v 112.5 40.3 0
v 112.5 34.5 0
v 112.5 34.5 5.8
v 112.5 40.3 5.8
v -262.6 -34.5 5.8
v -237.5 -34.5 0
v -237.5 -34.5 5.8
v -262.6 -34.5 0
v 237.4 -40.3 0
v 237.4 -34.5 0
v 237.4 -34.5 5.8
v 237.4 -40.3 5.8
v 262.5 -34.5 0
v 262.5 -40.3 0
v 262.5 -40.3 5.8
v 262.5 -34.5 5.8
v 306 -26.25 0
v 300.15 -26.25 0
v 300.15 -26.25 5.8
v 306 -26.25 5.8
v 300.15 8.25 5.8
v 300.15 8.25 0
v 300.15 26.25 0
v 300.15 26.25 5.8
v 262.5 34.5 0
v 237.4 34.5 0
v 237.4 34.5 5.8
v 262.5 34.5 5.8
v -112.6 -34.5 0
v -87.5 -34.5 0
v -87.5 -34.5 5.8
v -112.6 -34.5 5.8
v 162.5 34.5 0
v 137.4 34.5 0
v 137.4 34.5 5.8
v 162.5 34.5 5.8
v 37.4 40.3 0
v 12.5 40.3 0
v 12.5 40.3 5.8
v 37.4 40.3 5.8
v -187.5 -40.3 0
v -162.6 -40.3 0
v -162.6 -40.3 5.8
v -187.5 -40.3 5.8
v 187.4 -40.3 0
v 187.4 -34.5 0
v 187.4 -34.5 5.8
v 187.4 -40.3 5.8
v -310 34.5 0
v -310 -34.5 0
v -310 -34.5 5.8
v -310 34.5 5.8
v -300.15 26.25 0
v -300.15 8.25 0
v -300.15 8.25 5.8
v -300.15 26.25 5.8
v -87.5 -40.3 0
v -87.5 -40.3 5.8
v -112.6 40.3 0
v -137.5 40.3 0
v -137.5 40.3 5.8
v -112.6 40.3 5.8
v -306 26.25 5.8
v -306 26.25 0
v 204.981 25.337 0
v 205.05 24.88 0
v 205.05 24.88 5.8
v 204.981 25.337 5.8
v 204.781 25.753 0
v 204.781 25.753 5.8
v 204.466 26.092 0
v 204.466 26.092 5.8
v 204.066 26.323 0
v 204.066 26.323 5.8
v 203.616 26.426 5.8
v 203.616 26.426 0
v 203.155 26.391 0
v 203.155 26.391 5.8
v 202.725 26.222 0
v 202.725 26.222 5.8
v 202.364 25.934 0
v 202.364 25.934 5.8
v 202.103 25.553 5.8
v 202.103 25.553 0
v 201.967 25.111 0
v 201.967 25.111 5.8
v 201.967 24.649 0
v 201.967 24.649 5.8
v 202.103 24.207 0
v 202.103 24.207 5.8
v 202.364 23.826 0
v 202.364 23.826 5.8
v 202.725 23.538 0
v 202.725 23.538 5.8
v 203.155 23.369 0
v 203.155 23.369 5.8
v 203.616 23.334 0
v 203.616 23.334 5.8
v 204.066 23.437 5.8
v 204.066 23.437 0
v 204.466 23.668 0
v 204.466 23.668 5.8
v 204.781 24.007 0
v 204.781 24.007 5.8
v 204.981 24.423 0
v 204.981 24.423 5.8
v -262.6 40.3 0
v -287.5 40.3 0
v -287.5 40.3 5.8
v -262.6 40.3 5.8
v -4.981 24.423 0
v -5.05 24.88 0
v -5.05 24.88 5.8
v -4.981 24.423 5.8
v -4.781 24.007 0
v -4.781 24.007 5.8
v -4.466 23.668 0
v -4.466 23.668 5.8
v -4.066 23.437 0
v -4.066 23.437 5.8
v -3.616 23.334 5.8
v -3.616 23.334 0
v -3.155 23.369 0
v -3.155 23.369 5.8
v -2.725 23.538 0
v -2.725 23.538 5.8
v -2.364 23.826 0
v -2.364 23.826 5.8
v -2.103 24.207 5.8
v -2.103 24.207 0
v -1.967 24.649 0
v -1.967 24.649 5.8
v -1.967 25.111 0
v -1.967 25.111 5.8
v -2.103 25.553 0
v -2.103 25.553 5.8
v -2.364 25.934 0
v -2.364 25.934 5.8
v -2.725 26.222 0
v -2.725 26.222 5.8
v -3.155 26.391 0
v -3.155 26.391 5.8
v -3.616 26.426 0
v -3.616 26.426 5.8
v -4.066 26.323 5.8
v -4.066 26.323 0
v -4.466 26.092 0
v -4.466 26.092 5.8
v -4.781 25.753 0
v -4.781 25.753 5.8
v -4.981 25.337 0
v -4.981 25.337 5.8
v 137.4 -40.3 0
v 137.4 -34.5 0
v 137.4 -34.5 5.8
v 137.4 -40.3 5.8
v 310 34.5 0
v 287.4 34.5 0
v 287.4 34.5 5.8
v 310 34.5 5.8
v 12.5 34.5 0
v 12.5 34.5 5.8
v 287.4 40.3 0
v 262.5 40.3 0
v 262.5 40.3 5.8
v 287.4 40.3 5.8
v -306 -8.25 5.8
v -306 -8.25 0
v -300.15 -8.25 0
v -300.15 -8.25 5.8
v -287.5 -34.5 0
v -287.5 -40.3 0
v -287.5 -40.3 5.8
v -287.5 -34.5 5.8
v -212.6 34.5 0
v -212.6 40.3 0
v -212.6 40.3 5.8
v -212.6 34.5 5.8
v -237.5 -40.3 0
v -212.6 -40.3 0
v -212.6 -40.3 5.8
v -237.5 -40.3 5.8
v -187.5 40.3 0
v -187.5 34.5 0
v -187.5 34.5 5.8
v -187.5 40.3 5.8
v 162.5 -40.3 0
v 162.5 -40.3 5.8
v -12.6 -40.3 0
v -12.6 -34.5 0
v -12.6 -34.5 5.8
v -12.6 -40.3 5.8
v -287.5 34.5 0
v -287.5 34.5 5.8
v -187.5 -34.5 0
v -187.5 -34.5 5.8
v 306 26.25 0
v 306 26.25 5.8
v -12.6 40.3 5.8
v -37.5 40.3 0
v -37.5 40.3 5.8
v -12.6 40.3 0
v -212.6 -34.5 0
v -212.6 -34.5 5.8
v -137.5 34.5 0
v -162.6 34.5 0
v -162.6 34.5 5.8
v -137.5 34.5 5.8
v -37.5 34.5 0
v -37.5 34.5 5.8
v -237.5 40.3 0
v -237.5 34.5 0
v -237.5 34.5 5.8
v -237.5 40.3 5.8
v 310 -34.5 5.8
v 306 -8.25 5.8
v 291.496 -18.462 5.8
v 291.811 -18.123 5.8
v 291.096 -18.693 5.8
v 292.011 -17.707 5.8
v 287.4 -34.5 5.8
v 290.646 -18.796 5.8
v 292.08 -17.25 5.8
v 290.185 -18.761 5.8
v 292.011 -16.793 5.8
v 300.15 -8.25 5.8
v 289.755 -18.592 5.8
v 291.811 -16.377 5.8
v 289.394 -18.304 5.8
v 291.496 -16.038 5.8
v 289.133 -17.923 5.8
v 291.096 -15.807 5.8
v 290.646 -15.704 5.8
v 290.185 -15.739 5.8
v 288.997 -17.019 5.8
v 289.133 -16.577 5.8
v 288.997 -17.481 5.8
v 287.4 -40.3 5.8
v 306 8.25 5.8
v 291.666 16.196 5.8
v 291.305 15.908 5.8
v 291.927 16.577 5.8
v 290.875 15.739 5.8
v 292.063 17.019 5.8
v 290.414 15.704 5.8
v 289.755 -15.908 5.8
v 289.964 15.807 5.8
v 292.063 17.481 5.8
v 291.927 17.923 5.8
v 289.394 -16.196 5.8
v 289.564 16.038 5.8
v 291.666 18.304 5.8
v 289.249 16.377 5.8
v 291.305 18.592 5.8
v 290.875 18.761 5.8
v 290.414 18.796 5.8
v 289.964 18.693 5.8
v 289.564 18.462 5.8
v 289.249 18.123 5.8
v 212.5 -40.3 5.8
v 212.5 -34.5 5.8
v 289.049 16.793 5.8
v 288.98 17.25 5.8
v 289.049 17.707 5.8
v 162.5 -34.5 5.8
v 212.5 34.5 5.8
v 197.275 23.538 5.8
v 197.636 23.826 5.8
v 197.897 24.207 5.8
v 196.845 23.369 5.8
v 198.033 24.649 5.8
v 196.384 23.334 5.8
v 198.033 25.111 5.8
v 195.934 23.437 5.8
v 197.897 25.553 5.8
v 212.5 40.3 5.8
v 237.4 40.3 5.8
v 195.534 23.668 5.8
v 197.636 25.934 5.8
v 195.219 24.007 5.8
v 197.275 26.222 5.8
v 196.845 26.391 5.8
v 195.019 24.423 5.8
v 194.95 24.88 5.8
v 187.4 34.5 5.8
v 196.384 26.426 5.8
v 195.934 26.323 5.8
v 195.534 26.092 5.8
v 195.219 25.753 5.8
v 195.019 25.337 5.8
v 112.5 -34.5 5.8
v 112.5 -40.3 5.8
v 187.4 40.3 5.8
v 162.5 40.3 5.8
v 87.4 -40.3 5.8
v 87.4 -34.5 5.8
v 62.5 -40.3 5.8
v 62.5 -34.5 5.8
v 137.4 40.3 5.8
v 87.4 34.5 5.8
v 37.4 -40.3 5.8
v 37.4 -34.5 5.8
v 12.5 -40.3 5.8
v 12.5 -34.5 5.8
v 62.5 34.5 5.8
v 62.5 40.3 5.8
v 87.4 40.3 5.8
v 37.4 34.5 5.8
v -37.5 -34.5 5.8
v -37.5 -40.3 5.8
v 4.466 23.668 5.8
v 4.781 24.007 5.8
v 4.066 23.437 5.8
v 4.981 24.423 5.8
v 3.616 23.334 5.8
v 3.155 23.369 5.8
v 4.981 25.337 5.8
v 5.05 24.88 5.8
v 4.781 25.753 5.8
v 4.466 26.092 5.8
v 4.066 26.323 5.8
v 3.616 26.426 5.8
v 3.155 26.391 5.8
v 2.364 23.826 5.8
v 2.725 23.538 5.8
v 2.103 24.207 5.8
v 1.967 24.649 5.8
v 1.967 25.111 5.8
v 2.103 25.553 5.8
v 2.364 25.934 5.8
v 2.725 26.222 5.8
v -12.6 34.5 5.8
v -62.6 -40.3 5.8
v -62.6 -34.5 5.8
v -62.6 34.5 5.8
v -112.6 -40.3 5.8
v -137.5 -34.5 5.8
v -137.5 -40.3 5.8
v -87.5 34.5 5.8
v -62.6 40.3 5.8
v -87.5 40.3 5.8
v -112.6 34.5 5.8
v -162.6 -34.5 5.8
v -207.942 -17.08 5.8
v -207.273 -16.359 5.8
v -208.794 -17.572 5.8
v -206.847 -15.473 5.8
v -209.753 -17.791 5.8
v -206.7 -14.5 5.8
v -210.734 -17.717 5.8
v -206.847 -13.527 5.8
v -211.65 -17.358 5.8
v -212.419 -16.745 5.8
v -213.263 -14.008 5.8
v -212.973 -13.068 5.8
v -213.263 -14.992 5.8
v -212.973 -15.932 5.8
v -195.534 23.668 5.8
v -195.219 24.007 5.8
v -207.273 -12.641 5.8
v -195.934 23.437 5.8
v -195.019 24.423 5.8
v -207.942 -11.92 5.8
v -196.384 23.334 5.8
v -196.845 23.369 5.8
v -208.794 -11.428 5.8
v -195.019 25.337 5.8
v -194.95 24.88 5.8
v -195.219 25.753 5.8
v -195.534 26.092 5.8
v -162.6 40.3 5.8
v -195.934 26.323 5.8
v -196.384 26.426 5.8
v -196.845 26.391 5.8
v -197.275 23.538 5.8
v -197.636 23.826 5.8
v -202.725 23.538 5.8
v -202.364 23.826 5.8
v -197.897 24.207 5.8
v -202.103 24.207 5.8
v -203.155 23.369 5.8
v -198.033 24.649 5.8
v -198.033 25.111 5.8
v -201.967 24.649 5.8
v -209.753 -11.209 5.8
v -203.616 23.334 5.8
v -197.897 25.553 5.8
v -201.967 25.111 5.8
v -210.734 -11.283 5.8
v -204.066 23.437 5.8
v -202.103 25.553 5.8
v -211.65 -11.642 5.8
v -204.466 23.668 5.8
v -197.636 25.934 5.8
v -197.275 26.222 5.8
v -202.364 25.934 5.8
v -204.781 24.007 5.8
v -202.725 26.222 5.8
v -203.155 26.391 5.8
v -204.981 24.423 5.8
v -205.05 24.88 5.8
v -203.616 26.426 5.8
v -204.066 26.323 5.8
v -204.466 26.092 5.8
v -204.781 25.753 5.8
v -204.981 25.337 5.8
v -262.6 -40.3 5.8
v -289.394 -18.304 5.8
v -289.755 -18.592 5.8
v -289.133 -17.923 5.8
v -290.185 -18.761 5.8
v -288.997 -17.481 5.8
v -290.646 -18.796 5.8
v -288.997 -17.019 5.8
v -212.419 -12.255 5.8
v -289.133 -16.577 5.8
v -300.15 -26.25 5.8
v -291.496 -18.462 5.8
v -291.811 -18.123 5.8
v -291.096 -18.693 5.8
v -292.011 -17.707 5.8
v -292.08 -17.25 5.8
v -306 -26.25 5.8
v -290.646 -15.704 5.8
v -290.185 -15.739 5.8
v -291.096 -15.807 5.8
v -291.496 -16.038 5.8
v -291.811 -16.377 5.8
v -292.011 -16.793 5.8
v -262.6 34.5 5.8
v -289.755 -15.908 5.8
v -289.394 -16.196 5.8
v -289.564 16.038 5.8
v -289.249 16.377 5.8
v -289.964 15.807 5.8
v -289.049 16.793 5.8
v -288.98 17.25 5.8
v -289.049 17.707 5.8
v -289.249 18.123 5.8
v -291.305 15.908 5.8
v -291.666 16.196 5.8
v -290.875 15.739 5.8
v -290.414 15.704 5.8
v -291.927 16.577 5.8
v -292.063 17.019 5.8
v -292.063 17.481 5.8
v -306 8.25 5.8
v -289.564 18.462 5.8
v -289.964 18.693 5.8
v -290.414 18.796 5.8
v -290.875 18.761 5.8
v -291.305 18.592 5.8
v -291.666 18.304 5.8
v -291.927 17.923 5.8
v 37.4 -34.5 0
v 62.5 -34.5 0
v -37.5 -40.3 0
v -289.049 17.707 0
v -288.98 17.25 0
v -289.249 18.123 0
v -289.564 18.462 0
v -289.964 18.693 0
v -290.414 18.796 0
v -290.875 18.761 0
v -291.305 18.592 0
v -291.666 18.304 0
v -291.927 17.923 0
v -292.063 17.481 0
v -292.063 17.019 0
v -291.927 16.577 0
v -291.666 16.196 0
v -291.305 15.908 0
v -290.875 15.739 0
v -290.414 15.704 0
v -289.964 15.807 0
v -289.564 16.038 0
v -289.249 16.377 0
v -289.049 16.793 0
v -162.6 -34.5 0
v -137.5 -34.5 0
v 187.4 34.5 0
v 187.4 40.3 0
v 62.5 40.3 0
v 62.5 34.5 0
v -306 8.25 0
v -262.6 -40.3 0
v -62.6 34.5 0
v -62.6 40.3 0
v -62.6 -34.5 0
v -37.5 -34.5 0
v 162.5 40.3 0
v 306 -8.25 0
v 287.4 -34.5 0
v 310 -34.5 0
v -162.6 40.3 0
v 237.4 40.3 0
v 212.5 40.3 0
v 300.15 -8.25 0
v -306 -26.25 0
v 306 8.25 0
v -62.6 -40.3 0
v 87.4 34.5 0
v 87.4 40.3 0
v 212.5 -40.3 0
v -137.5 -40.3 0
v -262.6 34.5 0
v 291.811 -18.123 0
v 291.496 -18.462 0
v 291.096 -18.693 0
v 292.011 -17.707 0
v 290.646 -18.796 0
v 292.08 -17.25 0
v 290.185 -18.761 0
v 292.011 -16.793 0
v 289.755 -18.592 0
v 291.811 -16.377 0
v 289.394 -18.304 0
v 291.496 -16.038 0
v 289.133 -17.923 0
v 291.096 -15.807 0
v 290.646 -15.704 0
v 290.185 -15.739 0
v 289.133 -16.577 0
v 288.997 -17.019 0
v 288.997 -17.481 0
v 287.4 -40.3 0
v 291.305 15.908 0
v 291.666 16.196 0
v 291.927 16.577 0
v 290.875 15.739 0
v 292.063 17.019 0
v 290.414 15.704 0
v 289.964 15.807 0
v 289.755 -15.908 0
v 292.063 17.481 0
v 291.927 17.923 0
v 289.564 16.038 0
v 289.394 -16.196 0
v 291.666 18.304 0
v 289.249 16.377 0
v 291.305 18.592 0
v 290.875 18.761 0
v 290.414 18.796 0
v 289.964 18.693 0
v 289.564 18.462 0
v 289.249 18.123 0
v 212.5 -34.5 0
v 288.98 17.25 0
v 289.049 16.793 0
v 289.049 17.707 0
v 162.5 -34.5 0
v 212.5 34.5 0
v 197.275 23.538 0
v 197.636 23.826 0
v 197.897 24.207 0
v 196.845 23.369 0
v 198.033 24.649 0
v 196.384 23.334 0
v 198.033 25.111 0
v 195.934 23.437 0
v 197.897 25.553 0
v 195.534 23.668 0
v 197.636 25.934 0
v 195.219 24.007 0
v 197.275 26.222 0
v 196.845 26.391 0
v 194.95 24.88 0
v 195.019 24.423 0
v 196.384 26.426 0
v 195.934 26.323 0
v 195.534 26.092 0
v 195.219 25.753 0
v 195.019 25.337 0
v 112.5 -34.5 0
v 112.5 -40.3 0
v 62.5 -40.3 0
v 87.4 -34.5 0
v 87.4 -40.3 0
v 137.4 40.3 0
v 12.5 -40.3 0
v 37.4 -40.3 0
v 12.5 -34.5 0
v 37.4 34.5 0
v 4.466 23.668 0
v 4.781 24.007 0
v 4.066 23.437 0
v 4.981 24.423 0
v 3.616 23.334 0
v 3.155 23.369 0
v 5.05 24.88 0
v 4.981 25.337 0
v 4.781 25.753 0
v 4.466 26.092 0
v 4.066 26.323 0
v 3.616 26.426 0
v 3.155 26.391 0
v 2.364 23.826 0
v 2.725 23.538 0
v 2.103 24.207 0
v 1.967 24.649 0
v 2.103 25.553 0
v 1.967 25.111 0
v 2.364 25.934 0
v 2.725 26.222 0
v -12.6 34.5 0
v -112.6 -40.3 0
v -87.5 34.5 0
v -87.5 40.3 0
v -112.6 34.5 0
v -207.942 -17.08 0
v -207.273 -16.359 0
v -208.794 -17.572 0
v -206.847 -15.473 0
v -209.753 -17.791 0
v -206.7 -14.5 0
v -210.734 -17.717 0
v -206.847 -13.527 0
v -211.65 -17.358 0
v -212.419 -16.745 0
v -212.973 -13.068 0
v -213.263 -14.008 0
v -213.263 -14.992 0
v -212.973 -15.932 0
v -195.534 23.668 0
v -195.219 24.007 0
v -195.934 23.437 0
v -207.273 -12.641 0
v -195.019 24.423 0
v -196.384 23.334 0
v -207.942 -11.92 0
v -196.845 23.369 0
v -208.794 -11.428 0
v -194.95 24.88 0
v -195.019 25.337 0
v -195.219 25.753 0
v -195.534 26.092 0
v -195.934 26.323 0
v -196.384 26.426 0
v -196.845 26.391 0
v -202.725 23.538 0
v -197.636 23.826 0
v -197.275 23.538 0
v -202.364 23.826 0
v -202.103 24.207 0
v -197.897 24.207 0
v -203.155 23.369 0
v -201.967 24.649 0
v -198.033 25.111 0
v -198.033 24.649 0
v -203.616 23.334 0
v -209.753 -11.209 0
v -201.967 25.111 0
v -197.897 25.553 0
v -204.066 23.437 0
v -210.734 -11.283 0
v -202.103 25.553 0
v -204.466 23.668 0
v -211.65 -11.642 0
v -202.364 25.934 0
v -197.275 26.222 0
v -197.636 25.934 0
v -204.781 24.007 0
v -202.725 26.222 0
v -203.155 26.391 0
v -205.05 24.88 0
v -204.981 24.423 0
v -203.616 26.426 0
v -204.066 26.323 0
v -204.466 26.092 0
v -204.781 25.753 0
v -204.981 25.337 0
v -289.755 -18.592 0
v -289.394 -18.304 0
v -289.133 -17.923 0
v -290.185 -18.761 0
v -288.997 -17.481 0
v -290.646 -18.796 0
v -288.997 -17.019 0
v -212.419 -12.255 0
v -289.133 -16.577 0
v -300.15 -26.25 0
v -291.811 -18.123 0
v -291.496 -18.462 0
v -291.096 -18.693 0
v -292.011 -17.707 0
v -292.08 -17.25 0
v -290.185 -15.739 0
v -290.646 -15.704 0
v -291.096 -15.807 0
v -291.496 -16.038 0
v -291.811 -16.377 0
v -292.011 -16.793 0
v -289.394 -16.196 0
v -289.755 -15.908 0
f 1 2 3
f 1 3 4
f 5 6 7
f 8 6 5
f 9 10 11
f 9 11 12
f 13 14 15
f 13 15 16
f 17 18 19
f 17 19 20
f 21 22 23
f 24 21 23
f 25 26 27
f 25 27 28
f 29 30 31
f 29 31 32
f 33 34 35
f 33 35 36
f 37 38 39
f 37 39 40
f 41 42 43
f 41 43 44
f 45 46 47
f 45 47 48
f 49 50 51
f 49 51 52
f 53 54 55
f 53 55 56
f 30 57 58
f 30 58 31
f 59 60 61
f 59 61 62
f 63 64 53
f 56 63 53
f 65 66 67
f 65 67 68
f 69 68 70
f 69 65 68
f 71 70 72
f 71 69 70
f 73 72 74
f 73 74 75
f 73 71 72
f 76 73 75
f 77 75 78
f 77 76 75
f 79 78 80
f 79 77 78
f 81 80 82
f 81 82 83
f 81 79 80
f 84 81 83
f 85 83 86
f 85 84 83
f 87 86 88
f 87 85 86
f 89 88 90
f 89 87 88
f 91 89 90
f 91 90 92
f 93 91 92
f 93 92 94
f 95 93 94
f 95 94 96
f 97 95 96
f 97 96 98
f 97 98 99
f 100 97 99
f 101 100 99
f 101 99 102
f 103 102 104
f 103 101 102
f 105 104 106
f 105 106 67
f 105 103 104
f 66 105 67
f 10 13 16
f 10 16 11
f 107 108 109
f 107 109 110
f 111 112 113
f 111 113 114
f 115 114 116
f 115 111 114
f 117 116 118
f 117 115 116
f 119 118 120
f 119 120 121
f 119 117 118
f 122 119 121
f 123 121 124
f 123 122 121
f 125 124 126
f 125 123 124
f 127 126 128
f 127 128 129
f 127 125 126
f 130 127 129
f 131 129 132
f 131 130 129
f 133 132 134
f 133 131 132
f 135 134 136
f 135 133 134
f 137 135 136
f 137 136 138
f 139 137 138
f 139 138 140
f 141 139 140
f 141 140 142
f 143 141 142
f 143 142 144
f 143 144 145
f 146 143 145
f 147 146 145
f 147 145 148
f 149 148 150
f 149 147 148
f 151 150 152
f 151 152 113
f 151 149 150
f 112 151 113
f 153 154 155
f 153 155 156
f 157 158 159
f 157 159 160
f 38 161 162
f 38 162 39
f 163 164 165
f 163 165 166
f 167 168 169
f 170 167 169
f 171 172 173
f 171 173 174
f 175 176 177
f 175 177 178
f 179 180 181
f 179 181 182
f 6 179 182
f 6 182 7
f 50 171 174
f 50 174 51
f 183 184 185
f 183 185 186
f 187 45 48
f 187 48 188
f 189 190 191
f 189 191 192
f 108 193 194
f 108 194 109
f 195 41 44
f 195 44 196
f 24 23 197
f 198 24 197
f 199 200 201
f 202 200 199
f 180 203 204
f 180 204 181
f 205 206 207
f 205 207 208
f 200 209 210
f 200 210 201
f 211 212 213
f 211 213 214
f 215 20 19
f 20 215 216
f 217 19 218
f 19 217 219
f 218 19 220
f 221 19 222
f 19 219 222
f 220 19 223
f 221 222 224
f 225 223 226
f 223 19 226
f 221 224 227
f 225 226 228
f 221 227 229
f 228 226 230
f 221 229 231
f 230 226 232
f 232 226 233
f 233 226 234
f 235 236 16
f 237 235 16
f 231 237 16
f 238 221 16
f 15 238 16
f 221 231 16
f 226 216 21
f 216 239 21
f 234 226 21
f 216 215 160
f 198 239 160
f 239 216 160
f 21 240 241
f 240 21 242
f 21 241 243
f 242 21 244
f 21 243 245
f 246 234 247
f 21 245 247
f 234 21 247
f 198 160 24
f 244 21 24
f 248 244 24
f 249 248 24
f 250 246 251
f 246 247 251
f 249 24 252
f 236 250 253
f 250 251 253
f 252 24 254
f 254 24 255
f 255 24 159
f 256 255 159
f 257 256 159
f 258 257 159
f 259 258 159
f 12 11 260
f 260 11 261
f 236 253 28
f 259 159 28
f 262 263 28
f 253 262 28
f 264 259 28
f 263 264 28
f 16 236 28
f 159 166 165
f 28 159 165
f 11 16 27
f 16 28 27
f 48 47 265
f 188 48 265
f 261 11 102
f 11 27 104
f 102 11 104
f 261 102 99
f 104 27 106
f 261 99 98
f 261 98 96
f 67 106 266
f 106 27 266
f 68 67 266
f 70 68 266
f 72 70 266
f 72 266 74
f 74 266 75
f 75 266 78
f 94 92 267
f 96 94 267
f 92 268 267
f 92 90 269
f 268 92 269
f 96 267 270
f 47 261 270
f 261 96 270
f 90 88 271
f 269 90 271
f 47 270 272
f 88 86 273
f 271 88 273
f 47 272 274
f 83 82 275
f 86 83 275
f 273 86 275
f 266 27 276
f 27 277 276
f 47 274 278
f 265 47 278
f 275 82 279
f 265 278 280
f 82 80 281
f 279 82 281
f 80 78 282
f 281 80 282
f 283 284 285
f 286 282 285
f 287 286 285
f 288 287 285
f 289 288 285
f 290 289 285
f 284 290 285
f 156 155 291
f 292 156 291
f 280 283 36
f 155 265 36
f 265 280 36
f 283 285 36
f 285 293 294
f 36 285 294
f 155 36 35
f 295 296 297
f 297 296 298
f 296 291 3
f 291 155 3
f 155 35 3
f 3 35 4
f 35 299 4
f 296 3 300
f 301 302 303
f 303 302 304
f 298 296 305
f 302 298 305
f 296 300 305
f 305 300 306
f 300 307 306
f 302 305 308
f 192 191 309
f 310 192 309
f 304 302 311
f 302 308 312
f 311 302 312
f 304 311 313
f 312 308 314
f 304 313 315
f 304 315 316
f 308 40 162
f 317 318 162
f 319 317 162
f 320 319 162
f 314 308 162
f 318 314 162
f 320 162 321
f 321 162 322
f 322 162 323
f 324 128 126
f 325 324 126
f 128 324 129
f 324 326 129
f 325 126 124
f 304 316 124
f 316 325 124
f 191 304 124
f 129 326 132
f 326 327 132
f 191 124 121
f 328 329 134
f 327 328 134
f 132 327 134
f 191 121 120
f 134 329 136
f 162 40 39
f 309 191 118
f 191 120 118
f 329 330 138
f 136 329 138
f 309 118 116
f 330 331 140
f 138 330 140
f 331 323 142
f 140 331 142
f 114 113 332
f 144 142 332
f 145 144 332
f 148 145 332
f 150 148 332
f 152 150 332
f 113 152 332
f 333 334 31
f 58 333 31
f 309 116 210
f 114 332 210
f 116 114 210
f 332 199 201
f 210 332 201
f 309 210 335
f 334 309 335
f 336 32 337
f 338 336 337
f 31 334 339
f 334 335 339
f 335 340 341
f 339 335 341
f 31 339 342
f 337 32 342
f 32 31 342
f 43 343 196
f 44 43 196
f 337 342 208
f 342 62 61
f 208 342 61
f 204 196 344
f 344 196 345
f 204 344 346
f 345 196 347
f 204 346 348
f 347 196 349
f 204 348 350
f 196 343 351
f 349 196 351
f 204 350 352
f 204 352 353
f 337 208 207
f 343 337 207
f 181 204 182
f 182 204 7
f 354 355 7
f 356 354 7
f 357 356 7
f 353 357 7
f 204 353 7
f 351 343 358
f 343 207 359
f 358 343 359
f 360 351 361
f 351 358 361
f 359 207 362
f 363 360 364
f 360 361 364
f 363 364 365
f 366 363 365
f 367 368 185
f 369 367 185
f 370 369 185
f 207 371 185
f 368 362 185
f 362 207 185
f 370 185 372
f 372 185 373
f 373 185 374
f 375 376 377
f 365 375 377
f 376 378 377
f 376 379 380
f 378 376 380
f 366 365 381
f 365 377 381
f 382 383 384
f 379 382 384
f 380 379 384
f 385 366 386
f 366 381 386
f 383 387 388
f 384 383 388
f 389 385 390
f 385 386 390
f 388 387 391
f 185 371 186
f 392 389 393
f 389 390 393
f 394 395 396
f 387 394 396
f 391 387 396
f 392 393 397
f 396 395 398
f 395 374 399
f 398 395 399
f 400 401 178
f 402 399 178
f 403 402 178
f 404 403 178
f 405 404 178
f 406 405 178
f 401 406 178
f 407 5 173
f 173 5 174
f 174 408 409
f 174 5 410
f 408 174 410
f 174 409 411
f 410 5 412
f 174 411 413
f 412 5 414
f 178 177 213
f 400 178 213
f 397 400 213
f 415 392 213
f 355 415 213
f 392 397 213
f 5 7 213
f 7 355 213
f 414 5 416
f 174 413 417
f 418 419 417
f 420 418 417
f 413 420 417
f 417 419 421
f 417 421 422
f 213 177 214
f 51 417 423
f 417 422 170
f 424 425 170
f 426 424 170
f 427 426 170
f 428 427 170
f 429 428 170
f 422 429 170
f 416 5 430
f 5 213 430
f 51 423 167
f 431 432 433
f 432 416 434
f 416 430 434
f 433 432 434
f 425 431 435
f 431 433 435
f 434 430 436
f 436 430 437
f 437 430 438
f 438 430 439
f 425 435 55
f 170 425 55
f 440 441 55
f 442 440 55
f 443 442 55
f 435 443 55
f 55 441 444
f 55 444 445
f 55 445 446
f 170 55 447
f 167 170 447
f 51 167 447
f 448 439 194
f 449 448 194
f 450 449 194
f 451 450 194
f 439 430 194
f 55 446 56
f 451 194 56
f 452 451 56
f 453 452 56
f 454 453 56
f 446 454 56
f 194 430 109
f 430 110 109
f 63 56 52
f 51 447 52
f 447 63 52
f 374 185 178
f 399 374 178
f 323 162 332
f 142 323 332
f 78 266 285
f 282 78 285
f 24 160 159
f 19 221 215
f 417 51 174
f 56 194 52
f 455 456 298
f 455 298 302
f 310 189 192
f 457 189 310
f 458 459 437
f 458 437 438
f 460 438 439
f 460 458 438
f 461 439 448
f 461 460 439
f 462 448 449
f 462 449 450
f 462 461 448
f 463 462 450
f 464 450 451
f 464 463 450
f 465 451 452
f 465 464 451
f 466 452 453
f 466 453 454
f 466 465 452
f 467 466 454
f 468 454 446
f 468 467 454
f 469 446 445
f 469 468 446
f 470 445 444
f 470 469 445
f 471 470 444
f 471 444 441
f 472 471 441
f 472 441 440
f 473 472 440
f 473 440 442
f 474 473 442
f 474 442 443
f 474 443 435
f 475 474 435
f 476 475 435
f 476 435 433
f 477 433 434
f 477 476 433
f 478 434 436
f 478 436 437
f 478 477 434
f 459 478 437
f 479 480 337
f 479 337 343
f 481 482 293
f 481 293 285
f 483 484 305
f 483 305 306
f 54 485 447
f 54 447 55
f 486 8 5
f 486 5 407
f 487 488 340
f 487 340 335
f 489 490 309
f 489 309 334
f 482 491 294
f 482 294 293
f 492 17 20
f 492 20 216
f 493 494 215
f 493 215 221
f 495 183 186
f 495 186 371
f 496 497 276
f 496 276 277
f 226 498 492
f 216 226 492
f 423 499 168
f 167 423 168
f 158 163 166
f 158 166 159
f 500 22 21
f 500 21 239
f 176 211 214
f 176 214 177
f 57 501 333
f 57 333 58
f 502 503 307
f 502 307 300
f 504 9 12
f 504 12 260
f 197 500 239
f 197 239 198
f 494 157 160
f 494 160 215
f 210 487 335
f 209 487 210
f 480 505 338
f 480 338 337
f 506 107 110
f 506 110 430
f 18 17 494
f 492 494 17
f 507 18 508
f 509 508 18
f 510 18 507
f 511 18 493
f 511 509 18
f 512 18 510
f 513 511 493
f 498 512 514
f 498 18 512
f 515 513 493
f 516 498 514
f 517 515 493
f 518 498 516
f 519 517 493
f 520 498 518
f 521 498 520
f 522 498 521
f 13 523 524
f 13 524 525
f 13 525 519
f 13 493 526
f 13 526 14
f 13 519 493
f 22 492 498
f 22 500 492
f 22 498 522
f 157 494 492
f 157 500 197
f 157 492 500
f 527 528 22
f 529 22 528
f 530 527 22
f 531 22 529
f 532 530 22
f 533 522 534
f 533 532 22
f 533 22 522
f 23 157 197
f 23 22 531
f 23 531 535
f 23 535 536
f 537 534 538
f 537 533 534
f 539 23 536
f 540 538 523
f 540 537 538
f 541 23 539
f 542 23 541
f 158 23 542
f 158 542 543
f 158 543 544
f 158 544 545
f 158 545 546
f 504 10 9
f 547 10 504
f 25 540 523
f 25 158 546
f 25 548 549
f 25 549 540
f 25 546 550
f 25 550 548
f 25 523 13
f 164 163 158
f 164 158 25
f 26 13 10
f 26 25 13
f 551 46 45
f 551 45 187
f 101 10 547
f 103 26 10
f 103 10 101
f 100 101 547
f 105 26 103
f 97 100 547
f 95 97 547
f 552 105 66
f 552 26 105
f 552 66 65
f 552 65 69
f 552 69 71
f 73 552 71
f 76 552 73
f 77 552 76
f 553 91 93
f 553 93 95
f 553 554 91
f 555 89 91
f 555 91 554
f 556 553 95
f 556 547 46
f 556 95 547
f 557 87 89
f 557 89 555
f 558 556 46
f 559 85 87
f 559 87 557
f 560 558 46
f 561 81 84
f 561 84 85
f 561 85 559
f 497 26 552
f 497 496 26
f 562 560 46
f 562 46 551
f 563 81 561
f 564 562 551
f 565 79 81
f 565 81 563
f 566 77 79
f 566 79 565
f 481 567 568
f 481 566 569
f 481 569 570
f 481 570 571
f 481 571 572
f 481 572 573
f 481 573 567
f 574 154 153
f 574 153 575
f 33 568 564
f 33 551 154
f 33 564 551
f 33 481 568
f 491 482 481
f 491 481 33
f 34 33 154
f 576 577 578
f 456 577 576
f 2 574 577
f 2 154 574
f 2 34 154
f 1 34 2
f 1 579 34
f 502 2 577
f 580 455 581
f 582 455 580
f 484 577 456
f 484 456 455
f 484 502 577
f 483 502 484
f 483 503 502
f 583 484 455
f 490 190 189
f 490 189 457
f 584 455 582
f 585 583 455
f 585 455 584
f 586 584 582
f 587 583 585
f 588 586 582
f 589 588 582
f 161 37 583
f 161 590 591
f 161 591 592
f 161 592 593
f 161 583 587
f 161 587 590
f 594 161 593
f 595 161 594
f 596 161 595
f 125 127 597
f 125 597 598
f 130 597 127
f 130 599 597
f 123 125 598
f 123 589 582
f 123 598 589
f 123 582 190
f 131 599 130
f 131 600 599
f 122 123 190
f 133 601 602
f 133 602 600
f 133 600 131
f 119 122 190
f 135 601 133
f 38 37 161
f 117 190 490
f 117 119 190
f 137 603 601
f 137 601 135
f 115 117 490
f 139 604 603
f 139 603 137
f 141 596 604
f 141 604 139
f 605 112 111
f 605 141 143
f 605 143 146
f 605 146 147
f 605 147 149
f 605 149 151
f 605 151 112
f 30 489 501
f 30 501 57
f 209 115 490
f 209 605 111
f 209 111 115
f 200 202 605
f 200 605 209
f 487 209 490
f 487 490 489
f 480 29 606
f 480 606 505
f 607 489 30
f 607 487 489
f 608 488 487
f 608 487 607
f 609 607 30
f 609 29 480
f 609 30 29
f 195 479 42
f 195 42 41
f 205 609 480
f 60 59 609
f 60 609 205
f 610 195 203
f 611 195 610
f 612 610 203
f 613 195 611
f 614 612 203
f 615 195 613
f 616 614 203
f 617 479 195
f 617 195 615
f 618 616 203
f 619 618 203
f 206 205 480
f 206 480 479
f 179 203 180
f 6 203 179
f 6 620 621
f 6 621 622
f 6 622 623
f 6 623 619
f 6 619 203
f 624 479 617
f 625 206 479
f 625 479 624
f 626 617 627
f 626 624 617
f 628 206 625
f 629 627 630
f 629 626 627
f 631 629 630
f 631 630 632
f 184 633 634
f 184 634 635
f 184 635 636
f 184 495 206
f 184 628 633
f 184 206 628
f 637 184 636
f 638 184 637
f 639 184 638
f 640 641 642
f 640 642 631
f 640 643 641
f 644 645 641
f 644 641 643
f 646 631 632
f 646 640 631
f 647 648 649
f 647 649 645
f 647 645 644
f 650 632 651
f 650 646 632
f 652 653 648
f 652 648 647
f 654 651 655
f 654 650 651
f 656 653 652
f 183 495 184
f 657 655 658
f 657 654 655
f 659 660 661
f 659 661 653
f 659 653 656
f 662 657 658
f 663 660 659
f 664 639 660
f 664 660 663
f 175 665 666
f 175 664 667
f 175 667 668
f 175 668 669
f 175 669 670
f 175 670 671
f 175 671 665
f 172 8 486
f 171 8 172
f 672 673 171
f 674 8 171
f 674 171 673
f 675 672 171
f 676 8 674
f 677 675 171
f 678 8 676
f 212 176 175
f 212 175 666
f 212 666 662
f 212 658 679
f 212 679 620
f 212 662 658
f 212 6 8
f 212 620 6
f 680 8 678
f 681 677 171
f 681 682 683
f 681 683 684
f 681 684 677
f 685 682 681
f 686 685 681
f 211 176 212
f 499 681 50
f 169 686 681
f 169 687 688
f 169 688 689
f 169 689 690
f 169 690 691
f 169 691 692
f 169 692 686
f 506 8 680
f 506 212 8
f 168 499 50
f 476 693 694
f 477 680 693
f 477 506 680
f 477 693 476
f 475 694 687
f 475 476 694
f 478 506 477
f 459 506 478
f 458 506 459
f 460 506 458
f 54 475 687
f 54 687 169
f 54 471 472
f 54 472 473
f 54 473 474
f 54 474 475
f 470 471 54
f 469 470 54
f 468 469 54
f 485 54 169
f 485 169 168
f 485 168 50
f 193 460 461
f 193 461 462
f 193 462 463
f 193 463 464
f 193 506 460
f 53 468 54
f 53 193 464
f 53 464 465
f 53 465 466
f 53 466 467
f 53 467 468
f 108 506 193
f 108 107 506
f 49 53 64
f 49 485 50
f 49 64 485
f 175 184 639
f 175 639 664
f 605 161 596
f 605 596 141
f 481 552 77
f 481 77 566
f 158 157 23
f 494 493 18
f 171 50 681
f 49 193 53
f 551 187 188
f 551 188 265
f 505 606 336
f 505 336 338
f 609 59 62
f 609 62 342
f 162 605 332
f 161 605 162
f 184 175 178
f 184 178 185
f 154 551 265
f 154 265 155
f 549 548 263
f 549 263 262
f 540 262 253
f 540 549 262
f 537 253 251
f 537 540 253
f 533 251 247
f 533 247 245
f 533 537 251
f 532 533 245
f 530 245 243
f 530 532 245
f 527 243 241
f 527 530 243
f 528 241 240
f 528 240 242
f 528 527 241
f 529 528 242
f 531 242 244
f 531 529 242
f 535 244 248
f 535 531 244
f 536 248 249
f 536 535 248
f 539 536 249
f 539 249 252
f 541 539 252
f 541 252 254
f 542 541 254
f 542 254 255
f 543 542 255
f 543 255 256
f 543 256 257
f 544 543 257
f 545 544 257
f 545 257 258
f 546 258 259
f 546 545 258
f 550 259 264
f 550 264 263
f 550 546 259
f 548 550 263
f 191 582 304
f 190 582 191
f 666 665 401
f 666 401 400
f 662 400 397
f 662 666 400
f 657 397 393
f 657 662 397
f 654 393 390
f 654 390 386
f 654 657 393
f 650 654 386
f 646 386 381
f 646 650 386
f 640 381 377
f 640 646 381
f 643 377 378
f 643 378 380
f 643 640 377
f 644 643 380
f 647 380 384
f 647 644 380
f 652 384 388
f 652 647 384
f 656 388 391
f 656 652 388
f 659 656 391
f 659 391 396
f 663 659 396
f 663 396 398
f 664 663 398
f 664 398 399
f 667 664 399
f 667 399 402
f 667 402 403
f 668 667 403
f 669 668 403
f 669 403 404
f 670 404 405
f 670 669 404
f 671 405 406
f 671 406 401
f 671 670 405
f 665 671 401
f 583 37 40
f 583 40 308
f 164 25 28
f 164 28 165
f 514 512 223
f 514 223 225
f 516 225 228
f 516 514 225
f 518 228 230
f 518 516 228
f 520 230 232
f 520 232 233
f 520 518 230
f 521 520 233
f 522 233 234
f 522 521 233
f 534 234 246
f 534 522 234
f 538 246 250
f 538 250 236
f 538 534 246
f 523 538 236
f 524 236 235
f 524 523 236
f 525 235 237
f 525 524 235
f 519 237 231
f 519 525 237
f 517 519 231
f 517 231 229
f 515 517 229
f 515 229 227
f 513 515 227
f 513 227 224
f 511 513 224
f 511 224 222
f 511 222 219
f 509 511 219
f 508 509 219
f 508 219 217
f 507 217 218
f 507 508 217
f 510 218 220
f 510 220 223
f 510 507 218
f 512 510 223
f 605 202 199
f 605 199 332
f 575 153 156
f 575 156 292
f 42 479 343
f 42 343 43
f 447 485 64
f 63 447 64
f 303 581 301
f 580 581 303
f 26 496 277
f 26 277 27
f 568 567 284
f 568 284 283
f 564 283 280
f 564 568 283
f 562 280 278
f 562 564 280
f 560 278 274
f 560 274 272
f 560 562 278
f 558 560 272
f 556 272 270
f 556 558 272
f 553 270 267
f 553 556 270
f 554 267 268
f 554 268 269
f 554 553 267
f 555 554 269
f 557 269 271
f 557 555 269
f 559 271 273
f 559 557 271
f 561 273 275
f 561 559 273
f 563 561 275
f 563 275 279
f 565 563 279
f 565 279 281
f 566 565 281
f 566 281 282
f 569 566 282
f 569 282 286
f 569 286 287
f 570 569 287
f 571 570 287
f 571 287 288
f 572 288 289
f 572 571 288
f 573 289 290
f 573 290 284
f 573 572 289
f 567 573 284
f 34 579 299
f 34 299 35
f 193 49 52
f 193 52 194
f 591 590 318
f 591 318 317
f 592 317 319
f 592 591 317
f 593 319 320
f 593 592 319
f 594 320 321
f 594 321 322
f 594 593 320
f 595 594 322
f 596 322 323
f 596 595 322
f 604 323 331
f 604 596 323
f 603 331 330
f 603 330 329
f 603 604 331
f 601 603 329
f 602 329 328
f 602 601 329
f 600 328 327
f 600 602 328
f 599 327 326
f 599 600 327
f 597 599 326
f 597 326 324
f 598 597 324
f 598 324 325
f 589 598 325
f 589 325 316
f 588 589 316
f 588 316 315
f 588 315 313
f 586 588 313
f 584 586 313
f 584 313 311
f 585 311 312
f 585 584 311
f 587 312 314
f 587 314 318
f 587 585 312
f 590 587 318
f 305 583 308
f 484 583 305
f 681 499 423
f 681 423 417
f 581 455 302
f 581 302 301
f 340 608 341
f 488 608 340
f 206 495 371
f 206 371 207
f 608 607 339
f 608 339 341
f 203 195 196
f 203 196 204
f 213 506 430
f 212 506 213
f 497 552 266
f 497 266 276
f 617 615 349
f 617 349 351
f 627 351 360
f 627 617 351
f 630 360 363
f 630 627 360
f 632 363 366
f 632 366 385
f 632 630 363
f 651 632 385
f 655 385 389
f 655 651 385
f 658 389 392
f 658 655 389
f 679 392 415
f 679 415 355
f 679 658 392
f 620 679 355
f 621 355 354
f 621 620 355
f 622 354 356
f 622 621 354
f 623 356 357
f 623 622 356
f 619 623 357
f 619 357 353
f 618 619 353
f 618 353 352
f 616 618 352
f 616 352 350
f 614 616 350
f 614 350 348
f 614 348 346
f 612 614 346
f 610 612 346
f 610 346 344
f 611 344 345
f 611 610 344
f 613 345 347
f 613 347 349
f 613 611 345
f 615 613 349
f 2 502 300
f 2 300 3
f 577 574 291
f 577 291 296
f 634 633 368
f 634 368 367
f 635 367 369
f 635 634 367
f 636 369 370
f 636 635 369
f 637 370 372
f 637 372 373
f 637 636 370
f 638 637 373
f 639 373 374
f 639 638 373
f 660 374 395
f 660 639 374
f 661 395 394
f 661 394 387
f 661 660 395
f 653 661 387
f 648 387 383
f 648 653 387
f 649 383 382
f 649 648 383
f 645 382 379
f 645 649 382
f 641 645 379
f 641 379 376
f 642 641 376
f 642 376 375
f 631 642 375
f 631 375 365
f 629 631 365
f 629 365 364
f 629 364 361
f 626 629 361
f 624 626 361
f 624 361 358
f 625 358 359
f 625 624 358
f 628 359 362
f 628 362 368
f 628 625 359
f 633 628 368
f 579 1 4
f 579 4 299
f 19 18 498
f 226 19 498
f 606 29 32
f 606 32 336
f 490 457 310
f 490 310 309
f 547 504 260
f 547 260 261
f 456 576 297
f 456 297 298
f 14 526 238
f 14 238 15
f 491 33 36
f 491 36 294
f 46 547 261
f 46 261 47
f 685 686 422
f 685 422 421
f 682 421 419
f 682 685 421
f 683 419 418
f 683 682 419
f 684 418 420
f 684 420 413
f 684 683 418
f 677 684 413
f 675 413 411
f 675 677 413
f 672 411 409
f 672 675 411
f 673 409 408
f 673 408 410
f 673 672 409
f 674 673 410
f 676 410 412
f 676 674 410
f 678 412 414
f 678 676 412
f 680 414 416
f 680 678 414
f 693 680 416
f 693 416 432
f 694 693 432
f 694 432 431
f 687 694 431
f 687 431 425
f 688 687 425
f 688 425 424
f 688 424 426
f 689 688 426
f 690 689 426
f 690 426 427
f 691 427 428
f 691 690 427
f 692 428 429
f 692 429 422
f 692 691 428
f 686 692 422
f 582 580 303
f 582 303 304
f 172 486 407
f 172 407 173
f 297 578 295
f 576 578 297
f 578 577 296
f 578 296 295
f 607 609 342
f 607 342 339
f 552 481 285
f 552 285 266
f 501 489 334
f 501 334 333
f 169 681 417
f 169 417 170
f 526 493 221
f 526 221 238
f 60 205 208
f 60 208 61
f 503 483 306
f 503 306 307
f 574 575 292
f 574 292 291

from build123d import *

# Parameters (mm, degrees)
SKETCH1_R           = 3.3
SKETCH1_R_2         = 1.55
SKETCH1_W           = 5.85
SKETCH1_H           = 18
BOSS_EXTRUDE1_DEPTH = 5.8


with BuildPart() as part:
    # Sketch1 → Boss-Extrude1 (new body)
    with BuildSketch(Plane.XY):
        Polygon((-237.5, 34.5), (-237.5, 40.3), (-212.6, 40.3), (-212.6, 34.5), (-187.5, 34.5), (-187.5, 40.3), (-162.6, 40.3), (-162.6, 34.5), (-137.5, 34.5), (-137.5, 40.3), (-112.6, 40.3), (-112.6, 34.5), (-87.5, 34.5), (-87.5, 40.3), (-62.6, 40.3), (-62.6, 34.5), (-37.5, 34.5), (-37.5, 40.3), (-12.6, 40.3), (-12.6, 34.5), (12.5, 34.5), (12.5, 40.3), (37.4, 40.3), (37.4, 34.5), (62.5, 34.5), (62.5, 40.3), (87.4, 40.3), (87.4, 34.5), (112.5, 34.5), (112.5, 40.3), (137.4, 40.3), (137.4, 34.5), (162.5, 34.5), (162.5, 40.3), (187.4, 40.3), (187.4, 34.5), (212.5, 34.5), (212.5, 40.3), (237.4, 40.3), (237.4, 34.5), (262.5, 34.5), (262.5, 40.3), (287.4, 40.3), (287.4, 34.5), (310, 34.5), (310, -34.5), (287.4, -34.5), (287.4, -40.3), (262.5, -40.3), (262.5, -34.5), (237.4, -34.5), (237.4, -40.3), (212.5, -40.3), (212.5, -34.5), (187.4, -34.5), (187.4, -40.3), (162.5, -40.3), (162.5, -34.5), (137.4, -34.5), (137.4, -40.3), (112.5, -40.3), (112.5, -34.5), (87.4, -34.5), (87.4, -40.3), (62.5, -40.3), (62.5, -34.5), (37.4, -34.5), (37.4, -40.3), (12.5, -40.3), (12.5, -34.5), (-12.6, -34.5), (-12.6, -40.3), (-37.5, -40.3), (-37.5, -34.5), (-62.6, -34.5), (-62.6, -40.3), (-87.5, -40.3), (-87.5, -34.5), (-112.6, -34.5), (-112.6, -40.3), (-137.5, -40.3), (-137.5, -34.5), (-162.6, -34.5), (-162.6, -40.3), (-187.5, -40.3), (-187.5, -34.5), (-212.6, -34.5), (-212.6, -40.3), (-237.5, -40.3), (-237.5, -34.5), (-262.6, -34.5), (-262.6, -40.3), (-287.5, -40.3), (-287.5, -34.5), (-310, -34.5), (-310, 34.5), (-287.5, 34.5), (-287.5, 40.3), (-262.6, 40.3), (-262.6, 34.5), align=None)
        with Locations((-210, -14.5)):
            Circle(SKETCH1_R, mode=Mode.SUBTRACT)
        with Locations((-290.53, 17.25)):
            Circle(SKETCH1_R_2, mode=Mode.SUBTRACT)
        with Locations(Location((-290.53, -17.25, 0), (0, 0, 180))):
            Circle(SKETCH1_R_2, mode=Mode.SUBTRACT)
        with Locations((290.53, -17.25)):
            Circle(SKETCH1_R_2, mode=Mode.SUBTRACT)
        with Locations(Location((290.53, 17.25, 0), (0, 0, 180))):
            Circle(SKETCH1_R_2, mode=Mode.SUBTRACT)
        with Locations((3.5, 24.88)):
            Circle(SKETCH1_R_2, mode=Mode.SUBTRACT)
        with Locations(Location((-3.5, 24.88, 0), (0, 0, 180))):
            Circle(SKETCH1_R_2, mode=Mode.SUBTRACT)
        with Locations(Location((196.5, 24.88, 0), (0, 0, 180))):
            Circle(SKETCH1_R_2, mode=Mode.SUBTRACT)
        with Locations((203.5, 24.88)):
            Circle(SKETCH1_R_2, mode=Mode.SUBTRACT)
        with Locations((-196.5, 24.88)):
            Circle(SKETCH1_R_2, mode=Mode.SUBTRACT)
        with Locations(Location((-203.5, 24.88, 0), (0, 0, 180))):
            Circle(SKETCH1_R_2, mode=Mode.SUBTRACT)
        with Locations((303.075, 17.25)):
            Rectangle(SKETCH1_W, SKETCH1_H, mode=Mode.SUBTRACT)
        with Locations((303.075, -17.25)):
            Rectangle(SKETCH1_W, SKETCH1_H, mode=Mode.SUBTRACT)
        with Locations((-303.075, -17.25)):
            Rectangle(SKETCH1_W, SKETCH1_H, mode=Mode.SUBTRACT)
        with Locations((-303.075, 17.25)):
            Rectangle(SKETCH1_W, SKETCH1_H, mode=Mode.SUBTRACT)
    extrude(amount=BOSS_EXTRUDE1_DEPTH)


solid = part.part
